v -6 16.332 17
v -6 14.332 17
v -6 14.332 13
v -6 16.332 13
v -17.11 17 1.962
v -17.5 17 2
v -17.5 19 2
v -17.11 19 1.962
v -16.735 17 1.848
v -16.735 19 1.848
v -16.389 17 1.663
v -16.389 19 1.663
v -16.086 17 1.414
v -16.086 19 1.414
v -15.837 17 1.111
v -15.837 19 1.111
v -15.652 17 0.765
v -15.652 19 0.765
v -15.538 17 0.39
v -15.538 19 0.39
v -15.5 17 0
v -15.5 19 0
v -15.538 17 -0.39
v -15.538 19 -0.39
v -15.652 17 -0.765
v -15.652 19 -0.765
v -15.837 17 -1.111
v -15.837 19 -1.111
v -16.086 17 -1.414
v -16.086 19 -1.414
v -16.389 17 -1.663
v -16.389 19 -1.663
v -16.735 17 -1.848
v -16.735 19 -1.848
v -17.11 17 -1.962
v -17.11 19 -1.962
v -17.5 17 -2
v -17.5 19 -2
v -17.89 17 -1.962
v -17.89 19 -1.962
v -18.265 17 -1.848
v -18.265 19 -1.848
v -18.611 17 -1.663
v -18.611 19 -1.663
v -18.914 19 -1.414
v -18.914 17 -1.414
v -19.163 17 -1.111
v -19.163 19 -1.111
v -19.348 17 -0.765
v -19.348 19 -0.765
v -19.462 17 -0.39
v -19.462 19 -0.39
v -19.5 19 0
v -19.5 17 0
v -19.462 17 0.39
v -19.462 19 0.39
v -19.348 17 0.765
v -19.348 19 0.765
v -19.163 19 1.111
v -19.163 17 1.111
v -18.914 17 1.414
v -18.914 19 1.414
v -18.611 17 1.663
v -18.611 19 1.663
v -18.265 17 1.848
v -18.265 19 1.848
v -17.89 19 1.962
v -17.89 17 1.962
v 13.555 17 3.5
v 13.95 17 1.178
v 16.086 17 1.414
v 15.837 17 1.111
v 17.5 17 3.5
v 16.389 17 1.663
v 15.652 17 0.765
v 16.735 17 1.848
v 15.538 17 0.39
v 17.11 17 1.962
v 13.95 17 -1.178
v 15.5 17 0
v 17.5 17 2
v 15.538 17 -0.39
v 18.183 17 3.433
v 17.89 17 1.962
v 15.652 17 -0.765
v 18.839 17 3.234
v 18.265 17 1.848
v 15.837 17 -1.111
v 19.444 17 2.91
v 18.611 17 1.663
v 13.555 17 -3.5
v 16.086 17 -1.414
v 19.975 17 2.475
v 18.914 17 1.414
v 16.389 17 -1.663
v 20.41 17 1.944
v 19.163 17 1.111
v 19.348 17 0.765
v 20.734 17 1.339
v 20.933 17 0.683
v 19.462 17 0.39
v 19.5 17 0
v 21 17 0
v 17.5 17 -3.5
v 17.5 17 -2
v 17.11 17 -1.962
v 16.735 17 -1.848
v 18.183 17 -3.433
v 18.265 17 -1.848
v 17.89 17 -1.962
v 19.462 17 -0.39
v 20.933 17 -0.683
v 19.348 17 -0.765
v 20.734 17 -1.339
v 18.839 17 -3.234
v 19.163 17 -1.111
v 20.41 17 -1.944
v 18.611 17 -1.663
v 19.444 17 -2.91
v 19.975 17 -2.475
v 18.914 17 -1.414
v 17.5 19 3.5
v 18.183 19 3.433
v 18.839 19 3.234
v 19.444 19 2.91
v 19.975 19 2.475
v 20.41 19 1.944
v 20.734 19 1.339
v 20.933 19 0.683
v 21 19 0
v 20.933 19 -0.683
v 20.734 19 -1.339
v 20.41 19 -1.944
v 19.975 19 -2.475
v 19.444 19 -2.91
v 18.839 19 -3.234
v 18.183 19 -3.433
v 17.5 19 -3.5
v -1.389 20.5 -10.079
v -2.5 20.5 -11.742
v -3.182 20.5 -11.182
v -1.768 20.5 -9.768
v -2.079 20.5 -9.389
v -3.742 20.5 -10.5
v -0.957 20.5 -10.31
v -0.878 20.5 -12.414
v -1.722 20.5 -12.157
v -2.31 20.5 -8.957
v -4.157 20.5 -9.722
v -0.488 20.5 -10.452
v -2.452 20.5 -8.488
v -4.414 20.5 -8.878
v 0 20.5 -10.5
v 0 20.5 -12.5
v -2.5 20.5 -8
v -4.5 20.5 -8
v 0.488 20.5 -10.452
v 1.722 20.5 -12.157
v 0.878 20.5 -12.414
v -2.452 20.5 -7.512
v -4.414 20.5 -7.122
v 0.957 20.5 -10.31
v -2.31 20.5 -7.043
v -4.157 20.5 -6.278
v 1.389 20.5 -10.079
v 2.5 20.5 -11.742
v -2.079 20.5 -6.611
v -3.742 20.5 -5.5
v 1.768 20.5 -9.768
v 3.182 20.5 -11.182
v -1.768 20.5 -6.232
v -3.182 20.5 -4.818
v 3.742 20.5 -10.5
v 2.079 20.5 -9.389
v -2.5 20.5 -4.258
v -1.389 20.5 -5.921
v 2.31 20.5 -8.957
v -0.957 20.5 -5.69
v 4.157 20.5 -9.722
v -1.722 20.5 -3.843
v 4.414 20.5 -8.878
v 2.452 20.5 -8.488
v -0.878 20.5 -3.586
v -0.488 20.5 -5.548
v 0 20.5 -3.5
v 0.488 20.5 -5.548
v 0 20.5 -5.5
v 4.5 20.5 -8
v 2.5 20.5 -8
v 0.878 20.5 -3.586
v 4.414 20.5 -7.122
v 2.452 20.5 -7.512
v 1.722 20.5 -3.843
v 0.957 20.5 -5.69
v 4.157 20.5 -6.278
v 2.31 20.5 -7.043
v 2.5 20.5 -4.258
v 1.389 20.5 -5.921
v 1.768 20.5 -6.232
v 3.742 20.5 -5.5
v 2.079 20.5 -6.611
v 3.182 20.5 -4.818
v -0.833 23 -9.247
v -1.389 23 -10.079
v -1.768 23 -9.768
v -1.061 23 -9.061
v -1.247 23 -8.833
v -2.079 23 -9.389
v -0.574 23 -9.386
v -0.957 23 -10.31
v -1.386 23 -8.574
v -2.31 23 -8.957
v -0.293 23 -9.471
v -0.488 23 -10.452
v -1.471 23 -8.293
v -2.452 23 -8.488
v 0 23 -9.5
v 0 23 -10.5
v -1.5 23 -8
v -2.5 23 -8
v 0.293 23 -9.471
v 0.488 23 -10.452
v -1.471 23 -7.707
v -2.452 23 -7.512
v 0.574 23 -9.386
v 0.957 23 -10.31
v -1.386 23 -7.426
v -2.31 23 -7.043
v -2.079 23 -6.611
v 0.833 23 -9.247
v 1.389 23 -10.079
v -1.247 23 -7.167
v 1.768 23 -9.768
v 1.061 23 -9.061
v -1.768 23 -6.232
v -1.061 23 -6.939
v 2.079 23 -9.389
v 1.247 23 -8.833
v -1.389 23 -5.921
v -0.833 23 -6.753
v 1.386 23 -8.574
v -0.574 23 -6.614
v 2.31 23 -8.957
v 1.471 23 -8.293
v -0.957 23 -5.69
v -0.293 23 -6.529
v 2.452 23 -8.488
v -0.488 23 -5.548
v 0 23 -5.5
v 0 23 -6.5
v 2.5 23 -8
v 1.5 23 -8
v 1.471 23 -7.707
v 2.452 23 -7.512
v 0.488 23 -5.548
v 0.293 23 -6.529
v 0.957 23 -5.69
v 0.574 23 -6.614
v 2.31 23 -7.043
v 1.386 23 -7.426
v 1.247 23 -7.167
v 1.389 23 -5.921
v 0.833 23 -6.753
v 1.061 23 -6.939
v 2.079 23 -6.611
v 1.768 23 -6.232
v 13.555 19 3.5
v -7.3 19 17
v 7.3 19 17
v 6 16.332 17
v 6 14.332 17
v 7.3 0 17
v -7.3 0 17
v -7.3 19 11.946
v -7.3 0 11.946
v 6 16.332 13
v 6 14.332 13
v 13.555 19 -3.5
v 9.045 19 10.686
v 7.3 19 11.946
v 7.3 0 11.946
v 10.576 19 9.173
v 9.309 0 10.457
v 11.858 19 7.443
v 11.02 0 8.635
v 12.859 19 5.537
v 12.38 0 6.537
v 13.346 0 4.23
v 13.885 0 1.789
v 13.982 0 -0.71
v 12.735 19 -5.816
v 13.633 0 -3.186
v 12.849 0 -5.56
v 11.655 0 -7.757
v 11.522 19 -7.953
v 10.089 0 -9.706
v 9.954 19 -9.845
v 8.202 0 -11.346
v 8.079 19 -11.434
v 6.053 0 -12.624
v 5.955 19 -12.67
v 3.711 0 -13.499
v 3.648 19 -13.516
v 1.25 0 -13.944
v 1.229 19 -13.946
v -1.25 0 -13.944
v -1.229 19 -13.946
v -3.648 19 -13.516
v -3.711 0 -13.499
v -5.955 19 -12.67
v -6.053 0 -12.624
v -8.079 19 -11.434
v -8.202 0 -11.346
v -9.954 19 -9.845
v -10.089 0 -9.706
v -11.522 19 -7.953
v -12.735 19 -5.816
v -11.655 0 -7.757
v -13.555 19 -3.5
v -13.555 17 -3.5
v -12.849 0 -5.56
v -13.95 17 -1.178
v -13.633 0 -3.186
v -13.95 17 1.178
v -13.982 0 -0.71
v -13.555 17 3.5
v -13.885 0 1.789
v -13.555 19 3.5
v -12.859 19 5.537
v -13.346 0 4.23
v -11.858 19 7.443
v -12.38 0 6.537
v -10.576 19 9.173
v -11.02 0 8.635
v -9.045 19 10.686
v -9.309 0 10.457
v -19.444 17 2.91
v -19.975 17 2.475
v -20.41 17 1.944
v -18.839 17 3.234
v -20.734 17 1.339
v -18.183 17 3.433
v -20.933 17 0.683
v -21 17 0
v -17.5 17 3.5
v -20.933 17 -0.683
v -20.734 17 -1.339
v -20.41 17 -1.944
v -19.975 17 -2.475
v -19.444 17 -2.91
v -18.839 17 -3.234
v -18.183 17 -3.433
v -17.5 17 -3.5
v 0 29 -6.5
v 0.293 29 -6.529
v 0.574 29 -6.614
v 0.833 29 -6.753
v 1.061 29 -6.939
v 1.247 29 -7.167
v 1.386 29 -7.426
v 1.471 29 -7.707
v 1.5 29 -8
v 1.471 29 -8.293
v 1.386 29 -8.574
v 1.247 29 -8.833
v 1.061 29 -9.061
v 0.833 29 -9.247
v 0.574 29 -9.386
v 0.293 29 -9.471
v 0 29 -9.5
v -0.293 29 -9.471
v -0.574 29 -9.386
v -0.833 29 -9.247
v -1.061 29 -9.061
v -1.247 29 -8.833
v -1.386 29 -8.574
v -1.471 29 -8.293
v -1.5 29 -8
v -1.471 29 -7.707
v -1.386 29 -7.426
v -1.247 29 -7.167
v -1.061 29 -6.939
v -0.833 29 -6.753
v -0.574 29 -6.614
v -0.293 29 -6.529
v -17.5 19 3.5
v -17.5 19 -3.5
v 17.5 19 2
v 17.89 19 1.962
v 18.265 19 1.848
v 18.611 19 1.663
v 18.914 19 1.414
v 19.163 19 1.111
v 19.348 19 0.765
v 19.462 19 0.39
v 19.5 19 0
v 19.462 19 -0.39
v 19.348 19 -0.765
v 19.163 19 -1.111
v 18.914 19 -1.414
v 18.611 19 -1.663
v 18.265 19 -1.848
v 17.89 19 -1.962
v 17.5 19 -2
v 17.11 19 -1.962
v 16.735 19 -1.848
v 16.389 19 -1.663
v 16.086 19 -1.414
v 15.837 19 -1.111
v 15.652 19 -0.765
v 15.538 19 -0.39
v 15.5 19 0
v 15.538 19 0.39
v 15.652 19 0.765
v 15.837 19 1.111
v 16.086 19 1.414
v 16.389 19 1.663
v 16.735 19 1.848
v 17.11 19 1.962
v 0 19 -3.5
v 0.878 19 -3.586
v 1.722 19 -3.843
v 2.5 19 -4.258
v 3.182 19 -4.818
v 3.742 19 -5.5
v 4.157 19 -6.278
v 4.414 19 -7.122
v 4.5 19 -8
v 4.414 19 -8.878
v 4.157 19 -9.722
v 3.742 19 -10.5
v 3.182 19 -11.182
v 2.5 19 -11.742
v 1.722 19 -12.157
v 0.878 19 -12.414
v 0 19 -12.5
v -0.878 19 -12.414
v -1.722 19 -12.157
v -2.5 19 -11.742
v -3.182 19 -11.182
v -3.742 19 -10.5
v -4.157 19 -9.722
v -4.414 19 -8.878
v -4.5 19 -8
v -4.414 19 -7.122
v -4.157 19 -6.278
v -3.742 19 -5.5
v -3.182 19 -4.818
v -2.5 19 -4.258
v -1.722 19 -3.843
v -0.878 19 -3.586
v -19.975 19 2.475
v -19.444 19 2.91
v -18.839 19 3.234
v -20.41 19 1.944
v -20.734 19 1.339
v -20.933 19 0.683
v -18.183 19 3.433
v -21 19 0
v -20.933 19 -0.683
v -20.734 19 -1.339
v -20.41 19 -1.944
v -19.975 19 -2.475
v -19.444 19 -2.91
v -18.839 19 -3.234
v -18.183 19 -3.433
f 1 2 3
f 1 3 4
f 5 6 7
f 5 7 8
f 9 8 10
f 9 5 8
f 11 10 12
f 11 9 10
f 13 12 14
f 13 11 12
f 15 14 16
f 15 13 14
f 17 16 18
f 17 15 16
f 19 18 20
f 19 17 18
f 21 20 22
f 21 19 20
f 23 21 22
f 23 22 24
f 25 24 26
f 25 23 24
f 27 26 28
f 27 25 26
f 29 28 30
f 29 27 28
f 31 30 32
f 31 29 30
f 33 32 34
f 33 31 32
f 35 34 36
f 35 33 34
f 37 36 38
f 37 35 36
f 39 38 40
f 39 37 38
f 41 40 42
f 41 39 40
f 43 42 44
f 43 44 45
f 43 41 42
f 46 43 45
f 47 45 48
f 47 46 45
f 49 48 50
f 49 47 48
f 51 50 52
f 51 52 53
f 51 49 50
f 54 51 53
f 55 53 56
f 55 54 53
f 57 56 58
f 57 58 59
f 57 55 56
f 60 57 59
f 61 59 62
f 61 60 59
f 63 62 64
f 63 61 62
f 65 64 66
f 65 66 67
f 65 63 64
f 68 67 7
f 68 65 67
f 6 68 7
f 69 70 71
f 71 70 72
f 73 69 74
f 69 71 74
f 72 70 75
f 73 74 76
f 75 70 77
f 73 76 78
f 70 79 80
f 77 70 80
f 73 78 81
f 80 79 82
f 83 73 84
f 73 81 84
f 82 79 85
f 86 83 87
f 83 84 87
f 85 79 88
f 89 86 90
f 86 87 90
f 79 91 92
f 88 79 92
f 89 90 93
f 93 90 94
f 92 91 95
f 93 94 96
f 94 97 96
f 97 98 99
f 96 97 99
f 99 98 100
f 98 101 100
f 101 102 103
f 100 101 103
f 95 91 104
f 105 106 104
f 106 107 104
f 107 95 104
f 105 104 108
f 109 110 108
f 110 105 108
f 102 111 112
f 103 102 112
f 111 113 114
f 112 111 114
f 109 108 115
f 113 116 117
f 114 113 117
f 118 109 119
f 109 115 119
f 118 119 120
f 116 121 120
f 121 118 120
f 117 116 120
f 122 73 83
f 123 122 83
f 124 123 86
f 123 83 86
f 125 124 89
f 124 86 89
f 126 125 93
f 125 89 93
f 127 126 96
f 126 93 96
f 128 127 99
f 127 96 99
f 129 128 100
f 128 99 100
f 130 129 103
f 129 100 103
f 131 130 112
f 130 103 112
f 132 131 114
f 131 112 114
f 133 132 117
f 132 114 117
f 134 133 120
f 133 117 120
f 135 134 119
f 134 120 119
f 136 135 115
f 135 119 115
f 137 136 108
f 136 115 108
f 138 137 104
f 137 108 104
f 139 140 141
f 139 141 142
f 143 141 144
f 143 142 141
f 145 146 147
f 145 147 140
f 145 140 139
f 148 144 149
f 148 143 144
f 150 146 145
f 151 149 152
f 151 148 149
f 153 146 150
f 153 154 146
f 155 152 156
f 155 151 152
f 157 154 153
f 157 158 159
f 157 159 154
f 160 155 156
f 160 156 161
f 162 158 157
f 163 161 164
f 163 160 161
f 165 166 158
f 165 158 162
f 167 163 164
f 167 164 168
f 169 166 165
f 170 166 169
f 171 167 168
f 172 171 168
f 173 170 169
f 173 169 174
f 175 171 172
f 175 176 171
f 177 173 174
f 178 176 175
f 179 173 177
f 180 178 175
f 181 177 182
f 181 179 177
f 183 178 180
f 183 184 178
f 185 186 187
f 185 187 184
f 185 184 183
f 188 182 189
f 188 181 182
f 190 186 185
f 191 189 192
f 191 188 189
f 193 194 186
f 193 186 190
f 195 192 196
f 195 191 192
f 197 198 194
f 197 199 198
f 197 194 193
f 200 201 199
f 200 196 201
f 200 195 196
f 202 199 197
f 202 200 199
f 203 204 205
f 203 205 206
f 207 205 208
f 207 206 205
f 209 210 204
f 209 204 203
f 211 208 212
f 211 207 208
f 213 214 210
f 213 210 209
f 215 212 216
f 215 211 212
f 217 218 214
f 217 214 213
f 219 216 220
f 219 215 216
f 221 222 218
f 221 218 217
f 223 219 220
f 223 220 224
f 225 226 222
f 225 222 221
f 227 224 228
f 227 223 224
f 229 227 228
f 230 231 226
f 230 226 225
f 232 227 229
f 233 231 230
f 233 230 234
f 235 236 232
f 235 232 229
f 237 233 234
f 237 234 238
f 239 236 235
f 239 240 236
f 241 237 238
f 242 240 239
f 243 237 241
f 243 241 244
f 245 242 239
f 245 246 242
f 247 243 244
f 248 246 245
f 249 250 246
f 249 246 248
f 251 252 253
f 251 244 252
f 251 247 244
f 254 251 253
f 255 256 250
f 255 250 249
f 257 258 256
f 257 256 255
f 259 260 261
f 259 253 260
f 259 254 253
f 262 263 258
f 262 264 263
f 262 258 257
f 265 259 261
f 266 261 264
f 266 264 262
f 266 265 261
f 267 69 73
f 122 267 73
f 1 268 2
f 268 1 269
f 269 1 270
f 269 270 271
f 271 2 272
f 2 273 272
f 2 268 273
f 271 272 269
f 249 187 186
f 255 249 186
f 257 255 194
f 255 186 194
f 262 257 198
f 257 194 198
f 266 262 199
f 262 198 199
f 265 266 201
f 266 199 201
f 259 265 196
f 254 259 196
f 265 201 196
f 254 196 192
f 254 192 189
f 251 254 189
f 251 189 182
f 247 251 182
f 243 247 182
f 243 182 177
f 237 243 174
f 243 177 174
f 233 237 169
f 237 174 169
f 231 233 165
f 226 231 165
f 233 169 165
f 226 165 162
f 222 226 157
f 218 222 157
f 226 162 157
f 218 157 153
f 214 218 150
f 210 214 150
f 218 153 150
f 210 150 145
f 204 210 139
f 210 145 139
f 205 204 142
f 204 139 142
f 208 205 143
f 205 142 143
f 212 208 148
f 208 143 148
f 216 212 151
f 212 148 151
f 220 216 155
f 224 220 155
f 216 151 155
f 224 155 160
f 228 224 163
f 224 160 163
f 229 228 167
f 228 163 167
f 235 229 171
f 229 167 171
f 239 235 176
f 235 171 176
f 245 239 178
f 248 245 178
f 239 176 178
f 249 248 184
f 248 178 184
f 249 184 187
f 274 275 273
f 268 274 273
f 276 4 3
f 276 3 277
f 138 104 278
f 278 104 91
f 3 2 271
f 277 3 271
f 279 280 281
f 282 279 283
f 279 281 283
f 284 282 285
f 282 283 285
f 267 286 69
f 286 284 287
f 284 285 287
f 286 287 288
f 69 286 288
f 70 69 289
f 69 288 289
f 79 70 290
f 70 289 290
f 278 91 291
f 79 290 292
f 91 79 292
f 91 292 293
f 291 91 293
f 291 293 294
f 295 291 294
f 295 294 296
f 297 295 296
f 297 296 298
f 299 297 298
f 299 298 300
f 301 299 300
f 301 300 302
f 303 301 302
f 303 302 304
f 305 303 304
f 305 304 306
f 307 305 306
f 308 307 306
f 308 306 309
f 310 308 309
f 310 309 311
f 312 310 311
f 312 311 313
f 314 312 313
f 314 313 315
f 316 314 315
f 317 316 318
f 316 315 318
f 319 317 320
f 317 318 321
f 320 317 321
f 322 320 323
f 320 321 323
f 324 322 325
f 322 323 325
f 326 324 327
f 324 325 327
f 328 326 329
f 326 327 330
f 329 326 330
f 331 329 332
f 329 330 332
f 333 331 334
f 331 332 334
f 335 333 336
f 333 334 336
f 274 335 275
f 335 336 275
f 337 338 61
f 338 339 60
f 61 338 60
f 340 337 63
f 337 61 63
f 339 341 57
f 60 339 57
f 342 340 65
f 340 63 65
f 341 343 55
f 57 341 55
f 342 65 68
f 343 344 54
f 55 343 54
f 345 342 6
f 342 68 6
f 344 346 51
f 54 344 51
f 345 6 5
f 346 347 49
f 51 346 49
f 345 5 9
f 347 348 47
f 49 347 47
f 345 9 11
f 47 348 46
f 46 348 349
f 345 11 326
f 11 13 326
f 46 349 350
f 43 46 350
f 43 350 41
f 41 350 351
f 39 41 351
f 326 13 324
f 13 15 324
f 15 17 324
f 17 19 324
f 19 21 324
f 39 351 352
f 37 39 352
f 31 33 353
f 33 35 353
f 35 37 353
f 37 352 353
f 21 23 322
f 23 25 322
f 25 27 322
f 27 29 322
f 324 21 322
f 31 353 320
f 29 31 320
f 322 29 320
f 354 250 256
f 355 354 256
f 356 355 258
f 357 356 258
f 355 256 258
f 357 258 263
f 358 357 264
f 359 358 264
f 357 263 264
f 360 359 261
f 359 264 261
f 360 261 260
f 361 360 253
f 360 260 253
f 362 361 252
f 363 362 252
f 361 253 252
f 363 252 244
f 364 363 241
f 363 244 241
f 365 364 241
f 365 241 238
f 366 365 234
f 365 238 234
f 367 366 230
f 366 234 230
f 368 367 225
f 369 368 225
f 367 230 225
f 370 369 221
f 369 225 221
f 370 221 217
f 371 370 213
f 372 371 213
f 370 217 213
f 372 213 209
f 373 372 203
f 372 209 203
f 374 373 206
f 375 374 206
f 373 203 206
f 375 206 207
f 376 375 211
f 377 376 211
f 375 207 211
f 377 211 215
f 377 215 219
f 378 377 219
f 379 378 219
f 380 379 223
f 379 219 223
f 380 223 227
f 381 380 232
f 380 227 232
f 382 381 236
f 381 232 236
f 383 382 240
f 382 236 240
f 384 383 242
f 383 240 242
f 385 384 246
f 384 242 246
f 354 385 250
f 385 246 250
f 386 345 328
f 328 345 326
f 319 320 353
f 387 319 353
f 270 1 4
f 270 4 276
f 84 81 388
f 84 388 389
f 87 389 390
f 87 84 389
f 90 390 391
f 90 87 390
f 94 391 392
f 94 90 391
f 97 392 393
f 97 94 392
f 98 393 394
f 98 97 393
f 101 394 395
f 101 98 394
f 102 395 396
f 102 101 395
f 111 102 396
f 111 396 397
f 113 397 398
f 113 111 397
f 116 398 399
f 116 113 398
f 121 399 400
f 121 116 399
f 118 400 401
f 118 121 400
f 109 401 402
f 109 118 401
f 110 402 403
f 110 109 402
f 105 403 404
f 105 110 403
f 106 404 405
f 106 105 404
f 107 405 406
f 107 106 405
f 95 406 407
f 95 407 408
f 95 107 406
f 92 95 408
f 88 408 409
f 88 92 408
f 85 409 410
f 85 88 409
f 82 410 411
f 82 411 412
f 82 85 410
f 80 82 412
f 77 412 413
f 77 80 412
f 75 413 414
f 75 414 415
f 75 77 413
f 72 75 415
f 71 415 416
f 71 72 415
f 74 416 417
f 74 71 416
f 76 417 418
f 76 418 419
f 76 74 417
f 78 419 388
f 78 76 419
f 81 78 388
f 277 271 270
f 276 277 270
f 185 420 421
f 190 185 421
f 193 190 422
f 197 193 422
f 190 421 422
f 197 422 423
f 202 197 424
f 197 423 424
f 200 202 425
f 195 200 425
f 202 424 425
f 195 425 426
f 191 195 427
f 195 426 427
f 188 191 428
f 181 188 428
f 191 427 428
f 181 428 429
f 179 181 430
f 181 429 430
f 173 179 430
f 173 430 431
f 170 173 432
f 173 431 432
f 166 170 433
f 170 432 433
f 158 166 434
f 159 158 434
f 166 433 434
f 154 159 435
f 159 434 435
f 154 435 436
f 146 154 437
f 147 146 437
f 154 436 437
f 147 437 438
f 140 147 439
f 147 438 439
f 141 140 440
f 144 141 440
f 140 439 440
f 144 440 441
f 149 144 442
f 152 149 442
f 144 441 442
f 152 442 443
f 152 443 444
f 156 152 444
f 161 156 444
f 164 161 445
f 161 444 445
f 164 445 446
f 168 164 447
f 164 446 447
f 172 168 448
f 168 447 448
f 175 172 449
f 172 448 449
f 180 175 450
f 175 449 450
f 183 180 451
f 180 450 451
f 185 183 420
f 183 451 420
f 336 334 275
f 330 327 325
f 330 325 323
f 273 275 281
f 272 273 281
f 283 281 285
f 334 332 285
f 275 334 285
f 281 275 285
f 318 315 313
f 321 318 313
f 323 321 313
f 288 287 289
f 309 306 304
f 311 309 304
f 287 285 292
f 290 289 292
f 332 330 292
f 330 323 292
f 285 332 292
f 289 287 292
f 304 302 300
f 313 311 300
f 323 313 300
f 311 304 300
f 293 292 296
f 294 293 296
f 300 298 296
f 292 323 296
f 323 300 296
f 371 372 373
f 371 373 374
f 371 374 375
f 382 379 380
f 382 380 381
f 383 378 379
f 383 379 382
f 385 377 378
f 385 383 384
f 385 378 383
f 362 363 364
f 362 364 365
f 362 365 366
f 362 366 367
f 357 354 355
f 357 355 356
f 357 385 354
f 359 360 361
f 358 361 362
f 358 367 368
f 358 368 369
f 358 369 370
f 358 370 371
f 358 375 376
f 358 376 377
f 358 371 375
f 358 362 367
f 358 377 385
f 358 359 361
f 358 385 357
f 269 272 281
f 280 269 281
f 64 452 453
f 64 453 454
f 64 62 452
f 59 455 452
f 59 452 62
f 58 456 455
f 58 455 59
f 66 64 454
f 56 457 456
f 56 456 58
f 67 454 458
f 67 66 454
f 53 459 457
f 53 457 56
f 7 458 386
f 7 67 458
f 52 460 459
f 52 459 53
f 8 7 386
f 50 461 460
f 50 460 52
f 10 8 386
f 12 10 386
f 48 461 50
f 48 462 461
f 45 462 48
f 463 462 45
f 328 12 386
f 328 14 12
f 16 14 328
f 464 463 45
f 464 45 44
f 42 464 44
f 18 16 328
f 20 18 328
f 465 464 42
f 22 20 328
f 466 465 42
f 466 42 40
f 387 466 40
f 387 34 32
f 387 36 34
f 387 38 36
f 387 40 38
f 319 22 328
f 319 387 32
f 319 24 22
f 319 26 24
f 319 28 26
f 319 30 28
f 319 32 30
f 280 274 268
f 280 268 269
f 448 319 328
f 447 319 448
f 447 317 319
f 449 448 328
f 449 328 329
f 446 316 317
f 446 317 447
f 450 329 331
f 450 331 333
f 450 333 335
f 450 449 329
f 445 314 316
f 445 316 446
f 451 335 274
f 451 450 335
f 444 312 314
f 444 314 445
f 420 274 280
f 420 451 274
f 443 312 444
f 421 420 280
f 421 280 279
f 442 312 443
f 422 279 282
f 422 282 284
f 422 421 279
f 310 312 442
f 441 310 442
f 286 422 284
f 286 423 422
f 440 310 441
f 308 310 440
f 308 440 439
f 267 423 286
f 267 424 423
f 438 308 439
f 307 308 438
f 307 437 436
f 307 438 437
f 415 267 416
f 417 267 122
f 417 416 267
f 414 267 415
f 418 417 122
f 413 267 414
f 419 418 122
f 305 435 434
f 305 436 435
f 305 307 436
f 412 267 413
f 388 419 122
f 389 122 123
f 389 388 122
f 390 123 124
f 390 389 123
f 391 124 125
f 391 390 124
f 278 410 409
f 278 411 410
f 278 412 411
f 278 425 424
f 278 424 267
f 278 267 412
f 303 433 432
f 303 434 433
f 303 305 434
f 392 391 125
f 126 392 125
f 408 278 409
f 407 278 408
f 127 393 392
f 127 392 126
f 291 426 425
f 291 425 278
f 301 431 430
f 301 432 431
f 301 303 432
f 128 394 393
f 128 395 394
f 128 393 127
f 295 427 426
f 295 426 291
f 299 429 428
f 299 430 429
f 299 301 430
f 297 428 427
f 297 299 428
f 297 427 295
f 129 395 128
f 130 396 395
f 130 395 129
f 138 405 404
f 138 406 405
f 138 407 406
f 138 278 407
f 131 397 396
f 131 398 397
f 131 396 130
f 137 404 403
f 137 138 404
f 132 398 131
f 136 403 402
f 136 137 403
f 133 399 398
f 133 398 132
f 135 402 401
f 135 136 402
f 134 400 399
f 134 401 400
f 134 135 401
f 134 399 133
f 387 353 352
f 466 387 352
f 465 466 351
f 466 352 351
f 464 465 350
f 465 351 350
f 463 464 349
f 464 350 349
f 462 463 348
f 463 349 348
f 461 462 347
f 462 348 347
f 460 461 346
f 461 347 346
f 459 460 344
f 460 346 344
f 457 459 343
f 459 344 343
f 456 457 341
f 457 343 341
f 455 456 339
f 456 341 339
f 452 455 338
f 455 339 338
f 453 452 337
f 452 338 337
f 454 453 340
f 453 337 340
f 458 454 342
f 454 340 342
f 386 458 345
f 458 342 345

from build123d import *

# Parameters (mm, degrees)
SKETCH1_R           = 14
BOSS_EXTRUDE1_DEPTH = 19
BOSS_EXTRUDE2_START = -2
SKETCH4_R           = 2
BOSS_EXTRUDE2_DEPTH = 2
SKETCH5_R           = 4.5
BOSS_EXTRUDE3_DEPTH = 1.5
SKETCH6_R           = 2.5
BOSS_EXTRUDE4_DEPTH = 2.5
SKETCH7_R           = 1.5
BOSS_EXTRUDE5_DEPTH = 6
SKETCH8_W           = 12
SKETCH8_H           = 2
CUT_EXTRUDE1_DEPTH  = 4


with BuildPart() as part:
    # Sketch1 → Boss-Extrude1 (new body)
    with BuildSketch(Plane(origin=(0, 0, 0), x_dir=(1, 0, 0), z_dir=(0, 1, 0))):
        Circle(SKETCH1_R)
        with BuildLine():
            Line((-7.3, -11.94612908), (-7.3, -17))
            Line((-7.3, -17), (0, -17))
            Line((0, -17), (7.3, -17))
            Line((7.3, -17), (7.3, -11.94612908))
            ThreePointArc((7.3, -11.94612908), (0, -14), (-7.3, -11.94612908))
        make_face()
    extrude(amount=BOSS_EXTRUDE1_DEPTH)

    # Sketch4 → Boss-Extrude2 (add)
    # profile 1 of 2: a face of its own
    with BuildSketch(Plane(origin=(0, 19, 0), x_dir=(1, 0, 0), z_dir=(0, 1, 0)).offset(BOSS_EXTRUDE2_START)):
        with BuildLine():
            ThreePointArc((-17.5, 3.5), (-21, 0), (-17.5, -3.5))
            Line((-17.5, -3.5), (-13.555441712, -3.5))
            ThreePointArc((-13.555441712, -3.5), (-14, 0), (-13.555441712, 3.5))
            Line((-13.555441712, 3.5), (-17.5, 3.5))
        make_face()
        with Locations(Location((-17.5, 0, 0), (0, 0, 270))):
            Circle(SKETCH4_R, mode=Mode.SUBTRACT)
    # profile 2 of 2: a face of its own
    with BuildSketch(Plane(origin=(0, 19, 0), x_dir=(1, 0, 0), z_dir=(0, 1, 0)).offset(BOSS_EXTRUDE2_START)):
        with BuildLine():
            Line((17.5, 3.5), (13.555441712, 3.5))
            ThreePointArc((13.555441712, 3.5), (14, 0), (13.555441712, -3.5))
            Line((13.555441712, -3.5), (17.5, -3.5))
            ThreePointArc((17.5, -3.5), (21, 0), (17.5, 3.5))
        make_face()
        with Locations(Location((17.5, 0, 0), (0, 0, 270))):
            Circle(SKETCH4_R, mode=Mode.SUBTRACT)
    extrude(amount=BOSS_EXTRUDE2_DEPTH)

    # Sketch5 → Boss-Extrude3 (add)
    with BuildSketch(Plane(origin=(0, 19, 0), x_dir=(1, 0, 0), z_dir=(0, 1, 0))):
        with Locations(Location((0, 8, 0), (0, 0, 270))):
            Circle(SKETCH5_R)
    extrude(amount=BOSS_EXTRUDE3_DEPTH)

    # Sketch6 → Boss-Extrude4 (add)
    with BuildSketch(Plane(origin=(0, 20.5, 0), x_dir=(1, 0, 0), z_dir=(0, 1, 0))):
        with Locations(Location((0, 8, 0), (0, 0, 270))):
            Circle(SKETCH6_R)
    extrude(amount=BOSS_EXTRUDE4_DEPTH)

    # Sketch7 → Boss-Extrude5 (add)
    with BuildSketch(Plane(origin=(0, 23, 0), x_dir=(1, 0, 0), z_dir=(0, 1, 0))):
        with Locations(Location((0, 8, 0), (0, 0, 270))):
            Circle(SKETCH7_R)
    extrude(amount=BOSS_EXTRUDE5_DEPTH)

    # Sketch8 → Cut-Extrude1 (cut)
    with BuildSketch(Plane.XY.offset(17)):
        with Locations((0, 15.332469826)):
            Rectangle(SKETCH8_W, SKETCH8_H)
    extrude(amount=-CUT_EXTRUDE1_DEPTH, mode=Mode.SUBTRACT)


solid = part.part
